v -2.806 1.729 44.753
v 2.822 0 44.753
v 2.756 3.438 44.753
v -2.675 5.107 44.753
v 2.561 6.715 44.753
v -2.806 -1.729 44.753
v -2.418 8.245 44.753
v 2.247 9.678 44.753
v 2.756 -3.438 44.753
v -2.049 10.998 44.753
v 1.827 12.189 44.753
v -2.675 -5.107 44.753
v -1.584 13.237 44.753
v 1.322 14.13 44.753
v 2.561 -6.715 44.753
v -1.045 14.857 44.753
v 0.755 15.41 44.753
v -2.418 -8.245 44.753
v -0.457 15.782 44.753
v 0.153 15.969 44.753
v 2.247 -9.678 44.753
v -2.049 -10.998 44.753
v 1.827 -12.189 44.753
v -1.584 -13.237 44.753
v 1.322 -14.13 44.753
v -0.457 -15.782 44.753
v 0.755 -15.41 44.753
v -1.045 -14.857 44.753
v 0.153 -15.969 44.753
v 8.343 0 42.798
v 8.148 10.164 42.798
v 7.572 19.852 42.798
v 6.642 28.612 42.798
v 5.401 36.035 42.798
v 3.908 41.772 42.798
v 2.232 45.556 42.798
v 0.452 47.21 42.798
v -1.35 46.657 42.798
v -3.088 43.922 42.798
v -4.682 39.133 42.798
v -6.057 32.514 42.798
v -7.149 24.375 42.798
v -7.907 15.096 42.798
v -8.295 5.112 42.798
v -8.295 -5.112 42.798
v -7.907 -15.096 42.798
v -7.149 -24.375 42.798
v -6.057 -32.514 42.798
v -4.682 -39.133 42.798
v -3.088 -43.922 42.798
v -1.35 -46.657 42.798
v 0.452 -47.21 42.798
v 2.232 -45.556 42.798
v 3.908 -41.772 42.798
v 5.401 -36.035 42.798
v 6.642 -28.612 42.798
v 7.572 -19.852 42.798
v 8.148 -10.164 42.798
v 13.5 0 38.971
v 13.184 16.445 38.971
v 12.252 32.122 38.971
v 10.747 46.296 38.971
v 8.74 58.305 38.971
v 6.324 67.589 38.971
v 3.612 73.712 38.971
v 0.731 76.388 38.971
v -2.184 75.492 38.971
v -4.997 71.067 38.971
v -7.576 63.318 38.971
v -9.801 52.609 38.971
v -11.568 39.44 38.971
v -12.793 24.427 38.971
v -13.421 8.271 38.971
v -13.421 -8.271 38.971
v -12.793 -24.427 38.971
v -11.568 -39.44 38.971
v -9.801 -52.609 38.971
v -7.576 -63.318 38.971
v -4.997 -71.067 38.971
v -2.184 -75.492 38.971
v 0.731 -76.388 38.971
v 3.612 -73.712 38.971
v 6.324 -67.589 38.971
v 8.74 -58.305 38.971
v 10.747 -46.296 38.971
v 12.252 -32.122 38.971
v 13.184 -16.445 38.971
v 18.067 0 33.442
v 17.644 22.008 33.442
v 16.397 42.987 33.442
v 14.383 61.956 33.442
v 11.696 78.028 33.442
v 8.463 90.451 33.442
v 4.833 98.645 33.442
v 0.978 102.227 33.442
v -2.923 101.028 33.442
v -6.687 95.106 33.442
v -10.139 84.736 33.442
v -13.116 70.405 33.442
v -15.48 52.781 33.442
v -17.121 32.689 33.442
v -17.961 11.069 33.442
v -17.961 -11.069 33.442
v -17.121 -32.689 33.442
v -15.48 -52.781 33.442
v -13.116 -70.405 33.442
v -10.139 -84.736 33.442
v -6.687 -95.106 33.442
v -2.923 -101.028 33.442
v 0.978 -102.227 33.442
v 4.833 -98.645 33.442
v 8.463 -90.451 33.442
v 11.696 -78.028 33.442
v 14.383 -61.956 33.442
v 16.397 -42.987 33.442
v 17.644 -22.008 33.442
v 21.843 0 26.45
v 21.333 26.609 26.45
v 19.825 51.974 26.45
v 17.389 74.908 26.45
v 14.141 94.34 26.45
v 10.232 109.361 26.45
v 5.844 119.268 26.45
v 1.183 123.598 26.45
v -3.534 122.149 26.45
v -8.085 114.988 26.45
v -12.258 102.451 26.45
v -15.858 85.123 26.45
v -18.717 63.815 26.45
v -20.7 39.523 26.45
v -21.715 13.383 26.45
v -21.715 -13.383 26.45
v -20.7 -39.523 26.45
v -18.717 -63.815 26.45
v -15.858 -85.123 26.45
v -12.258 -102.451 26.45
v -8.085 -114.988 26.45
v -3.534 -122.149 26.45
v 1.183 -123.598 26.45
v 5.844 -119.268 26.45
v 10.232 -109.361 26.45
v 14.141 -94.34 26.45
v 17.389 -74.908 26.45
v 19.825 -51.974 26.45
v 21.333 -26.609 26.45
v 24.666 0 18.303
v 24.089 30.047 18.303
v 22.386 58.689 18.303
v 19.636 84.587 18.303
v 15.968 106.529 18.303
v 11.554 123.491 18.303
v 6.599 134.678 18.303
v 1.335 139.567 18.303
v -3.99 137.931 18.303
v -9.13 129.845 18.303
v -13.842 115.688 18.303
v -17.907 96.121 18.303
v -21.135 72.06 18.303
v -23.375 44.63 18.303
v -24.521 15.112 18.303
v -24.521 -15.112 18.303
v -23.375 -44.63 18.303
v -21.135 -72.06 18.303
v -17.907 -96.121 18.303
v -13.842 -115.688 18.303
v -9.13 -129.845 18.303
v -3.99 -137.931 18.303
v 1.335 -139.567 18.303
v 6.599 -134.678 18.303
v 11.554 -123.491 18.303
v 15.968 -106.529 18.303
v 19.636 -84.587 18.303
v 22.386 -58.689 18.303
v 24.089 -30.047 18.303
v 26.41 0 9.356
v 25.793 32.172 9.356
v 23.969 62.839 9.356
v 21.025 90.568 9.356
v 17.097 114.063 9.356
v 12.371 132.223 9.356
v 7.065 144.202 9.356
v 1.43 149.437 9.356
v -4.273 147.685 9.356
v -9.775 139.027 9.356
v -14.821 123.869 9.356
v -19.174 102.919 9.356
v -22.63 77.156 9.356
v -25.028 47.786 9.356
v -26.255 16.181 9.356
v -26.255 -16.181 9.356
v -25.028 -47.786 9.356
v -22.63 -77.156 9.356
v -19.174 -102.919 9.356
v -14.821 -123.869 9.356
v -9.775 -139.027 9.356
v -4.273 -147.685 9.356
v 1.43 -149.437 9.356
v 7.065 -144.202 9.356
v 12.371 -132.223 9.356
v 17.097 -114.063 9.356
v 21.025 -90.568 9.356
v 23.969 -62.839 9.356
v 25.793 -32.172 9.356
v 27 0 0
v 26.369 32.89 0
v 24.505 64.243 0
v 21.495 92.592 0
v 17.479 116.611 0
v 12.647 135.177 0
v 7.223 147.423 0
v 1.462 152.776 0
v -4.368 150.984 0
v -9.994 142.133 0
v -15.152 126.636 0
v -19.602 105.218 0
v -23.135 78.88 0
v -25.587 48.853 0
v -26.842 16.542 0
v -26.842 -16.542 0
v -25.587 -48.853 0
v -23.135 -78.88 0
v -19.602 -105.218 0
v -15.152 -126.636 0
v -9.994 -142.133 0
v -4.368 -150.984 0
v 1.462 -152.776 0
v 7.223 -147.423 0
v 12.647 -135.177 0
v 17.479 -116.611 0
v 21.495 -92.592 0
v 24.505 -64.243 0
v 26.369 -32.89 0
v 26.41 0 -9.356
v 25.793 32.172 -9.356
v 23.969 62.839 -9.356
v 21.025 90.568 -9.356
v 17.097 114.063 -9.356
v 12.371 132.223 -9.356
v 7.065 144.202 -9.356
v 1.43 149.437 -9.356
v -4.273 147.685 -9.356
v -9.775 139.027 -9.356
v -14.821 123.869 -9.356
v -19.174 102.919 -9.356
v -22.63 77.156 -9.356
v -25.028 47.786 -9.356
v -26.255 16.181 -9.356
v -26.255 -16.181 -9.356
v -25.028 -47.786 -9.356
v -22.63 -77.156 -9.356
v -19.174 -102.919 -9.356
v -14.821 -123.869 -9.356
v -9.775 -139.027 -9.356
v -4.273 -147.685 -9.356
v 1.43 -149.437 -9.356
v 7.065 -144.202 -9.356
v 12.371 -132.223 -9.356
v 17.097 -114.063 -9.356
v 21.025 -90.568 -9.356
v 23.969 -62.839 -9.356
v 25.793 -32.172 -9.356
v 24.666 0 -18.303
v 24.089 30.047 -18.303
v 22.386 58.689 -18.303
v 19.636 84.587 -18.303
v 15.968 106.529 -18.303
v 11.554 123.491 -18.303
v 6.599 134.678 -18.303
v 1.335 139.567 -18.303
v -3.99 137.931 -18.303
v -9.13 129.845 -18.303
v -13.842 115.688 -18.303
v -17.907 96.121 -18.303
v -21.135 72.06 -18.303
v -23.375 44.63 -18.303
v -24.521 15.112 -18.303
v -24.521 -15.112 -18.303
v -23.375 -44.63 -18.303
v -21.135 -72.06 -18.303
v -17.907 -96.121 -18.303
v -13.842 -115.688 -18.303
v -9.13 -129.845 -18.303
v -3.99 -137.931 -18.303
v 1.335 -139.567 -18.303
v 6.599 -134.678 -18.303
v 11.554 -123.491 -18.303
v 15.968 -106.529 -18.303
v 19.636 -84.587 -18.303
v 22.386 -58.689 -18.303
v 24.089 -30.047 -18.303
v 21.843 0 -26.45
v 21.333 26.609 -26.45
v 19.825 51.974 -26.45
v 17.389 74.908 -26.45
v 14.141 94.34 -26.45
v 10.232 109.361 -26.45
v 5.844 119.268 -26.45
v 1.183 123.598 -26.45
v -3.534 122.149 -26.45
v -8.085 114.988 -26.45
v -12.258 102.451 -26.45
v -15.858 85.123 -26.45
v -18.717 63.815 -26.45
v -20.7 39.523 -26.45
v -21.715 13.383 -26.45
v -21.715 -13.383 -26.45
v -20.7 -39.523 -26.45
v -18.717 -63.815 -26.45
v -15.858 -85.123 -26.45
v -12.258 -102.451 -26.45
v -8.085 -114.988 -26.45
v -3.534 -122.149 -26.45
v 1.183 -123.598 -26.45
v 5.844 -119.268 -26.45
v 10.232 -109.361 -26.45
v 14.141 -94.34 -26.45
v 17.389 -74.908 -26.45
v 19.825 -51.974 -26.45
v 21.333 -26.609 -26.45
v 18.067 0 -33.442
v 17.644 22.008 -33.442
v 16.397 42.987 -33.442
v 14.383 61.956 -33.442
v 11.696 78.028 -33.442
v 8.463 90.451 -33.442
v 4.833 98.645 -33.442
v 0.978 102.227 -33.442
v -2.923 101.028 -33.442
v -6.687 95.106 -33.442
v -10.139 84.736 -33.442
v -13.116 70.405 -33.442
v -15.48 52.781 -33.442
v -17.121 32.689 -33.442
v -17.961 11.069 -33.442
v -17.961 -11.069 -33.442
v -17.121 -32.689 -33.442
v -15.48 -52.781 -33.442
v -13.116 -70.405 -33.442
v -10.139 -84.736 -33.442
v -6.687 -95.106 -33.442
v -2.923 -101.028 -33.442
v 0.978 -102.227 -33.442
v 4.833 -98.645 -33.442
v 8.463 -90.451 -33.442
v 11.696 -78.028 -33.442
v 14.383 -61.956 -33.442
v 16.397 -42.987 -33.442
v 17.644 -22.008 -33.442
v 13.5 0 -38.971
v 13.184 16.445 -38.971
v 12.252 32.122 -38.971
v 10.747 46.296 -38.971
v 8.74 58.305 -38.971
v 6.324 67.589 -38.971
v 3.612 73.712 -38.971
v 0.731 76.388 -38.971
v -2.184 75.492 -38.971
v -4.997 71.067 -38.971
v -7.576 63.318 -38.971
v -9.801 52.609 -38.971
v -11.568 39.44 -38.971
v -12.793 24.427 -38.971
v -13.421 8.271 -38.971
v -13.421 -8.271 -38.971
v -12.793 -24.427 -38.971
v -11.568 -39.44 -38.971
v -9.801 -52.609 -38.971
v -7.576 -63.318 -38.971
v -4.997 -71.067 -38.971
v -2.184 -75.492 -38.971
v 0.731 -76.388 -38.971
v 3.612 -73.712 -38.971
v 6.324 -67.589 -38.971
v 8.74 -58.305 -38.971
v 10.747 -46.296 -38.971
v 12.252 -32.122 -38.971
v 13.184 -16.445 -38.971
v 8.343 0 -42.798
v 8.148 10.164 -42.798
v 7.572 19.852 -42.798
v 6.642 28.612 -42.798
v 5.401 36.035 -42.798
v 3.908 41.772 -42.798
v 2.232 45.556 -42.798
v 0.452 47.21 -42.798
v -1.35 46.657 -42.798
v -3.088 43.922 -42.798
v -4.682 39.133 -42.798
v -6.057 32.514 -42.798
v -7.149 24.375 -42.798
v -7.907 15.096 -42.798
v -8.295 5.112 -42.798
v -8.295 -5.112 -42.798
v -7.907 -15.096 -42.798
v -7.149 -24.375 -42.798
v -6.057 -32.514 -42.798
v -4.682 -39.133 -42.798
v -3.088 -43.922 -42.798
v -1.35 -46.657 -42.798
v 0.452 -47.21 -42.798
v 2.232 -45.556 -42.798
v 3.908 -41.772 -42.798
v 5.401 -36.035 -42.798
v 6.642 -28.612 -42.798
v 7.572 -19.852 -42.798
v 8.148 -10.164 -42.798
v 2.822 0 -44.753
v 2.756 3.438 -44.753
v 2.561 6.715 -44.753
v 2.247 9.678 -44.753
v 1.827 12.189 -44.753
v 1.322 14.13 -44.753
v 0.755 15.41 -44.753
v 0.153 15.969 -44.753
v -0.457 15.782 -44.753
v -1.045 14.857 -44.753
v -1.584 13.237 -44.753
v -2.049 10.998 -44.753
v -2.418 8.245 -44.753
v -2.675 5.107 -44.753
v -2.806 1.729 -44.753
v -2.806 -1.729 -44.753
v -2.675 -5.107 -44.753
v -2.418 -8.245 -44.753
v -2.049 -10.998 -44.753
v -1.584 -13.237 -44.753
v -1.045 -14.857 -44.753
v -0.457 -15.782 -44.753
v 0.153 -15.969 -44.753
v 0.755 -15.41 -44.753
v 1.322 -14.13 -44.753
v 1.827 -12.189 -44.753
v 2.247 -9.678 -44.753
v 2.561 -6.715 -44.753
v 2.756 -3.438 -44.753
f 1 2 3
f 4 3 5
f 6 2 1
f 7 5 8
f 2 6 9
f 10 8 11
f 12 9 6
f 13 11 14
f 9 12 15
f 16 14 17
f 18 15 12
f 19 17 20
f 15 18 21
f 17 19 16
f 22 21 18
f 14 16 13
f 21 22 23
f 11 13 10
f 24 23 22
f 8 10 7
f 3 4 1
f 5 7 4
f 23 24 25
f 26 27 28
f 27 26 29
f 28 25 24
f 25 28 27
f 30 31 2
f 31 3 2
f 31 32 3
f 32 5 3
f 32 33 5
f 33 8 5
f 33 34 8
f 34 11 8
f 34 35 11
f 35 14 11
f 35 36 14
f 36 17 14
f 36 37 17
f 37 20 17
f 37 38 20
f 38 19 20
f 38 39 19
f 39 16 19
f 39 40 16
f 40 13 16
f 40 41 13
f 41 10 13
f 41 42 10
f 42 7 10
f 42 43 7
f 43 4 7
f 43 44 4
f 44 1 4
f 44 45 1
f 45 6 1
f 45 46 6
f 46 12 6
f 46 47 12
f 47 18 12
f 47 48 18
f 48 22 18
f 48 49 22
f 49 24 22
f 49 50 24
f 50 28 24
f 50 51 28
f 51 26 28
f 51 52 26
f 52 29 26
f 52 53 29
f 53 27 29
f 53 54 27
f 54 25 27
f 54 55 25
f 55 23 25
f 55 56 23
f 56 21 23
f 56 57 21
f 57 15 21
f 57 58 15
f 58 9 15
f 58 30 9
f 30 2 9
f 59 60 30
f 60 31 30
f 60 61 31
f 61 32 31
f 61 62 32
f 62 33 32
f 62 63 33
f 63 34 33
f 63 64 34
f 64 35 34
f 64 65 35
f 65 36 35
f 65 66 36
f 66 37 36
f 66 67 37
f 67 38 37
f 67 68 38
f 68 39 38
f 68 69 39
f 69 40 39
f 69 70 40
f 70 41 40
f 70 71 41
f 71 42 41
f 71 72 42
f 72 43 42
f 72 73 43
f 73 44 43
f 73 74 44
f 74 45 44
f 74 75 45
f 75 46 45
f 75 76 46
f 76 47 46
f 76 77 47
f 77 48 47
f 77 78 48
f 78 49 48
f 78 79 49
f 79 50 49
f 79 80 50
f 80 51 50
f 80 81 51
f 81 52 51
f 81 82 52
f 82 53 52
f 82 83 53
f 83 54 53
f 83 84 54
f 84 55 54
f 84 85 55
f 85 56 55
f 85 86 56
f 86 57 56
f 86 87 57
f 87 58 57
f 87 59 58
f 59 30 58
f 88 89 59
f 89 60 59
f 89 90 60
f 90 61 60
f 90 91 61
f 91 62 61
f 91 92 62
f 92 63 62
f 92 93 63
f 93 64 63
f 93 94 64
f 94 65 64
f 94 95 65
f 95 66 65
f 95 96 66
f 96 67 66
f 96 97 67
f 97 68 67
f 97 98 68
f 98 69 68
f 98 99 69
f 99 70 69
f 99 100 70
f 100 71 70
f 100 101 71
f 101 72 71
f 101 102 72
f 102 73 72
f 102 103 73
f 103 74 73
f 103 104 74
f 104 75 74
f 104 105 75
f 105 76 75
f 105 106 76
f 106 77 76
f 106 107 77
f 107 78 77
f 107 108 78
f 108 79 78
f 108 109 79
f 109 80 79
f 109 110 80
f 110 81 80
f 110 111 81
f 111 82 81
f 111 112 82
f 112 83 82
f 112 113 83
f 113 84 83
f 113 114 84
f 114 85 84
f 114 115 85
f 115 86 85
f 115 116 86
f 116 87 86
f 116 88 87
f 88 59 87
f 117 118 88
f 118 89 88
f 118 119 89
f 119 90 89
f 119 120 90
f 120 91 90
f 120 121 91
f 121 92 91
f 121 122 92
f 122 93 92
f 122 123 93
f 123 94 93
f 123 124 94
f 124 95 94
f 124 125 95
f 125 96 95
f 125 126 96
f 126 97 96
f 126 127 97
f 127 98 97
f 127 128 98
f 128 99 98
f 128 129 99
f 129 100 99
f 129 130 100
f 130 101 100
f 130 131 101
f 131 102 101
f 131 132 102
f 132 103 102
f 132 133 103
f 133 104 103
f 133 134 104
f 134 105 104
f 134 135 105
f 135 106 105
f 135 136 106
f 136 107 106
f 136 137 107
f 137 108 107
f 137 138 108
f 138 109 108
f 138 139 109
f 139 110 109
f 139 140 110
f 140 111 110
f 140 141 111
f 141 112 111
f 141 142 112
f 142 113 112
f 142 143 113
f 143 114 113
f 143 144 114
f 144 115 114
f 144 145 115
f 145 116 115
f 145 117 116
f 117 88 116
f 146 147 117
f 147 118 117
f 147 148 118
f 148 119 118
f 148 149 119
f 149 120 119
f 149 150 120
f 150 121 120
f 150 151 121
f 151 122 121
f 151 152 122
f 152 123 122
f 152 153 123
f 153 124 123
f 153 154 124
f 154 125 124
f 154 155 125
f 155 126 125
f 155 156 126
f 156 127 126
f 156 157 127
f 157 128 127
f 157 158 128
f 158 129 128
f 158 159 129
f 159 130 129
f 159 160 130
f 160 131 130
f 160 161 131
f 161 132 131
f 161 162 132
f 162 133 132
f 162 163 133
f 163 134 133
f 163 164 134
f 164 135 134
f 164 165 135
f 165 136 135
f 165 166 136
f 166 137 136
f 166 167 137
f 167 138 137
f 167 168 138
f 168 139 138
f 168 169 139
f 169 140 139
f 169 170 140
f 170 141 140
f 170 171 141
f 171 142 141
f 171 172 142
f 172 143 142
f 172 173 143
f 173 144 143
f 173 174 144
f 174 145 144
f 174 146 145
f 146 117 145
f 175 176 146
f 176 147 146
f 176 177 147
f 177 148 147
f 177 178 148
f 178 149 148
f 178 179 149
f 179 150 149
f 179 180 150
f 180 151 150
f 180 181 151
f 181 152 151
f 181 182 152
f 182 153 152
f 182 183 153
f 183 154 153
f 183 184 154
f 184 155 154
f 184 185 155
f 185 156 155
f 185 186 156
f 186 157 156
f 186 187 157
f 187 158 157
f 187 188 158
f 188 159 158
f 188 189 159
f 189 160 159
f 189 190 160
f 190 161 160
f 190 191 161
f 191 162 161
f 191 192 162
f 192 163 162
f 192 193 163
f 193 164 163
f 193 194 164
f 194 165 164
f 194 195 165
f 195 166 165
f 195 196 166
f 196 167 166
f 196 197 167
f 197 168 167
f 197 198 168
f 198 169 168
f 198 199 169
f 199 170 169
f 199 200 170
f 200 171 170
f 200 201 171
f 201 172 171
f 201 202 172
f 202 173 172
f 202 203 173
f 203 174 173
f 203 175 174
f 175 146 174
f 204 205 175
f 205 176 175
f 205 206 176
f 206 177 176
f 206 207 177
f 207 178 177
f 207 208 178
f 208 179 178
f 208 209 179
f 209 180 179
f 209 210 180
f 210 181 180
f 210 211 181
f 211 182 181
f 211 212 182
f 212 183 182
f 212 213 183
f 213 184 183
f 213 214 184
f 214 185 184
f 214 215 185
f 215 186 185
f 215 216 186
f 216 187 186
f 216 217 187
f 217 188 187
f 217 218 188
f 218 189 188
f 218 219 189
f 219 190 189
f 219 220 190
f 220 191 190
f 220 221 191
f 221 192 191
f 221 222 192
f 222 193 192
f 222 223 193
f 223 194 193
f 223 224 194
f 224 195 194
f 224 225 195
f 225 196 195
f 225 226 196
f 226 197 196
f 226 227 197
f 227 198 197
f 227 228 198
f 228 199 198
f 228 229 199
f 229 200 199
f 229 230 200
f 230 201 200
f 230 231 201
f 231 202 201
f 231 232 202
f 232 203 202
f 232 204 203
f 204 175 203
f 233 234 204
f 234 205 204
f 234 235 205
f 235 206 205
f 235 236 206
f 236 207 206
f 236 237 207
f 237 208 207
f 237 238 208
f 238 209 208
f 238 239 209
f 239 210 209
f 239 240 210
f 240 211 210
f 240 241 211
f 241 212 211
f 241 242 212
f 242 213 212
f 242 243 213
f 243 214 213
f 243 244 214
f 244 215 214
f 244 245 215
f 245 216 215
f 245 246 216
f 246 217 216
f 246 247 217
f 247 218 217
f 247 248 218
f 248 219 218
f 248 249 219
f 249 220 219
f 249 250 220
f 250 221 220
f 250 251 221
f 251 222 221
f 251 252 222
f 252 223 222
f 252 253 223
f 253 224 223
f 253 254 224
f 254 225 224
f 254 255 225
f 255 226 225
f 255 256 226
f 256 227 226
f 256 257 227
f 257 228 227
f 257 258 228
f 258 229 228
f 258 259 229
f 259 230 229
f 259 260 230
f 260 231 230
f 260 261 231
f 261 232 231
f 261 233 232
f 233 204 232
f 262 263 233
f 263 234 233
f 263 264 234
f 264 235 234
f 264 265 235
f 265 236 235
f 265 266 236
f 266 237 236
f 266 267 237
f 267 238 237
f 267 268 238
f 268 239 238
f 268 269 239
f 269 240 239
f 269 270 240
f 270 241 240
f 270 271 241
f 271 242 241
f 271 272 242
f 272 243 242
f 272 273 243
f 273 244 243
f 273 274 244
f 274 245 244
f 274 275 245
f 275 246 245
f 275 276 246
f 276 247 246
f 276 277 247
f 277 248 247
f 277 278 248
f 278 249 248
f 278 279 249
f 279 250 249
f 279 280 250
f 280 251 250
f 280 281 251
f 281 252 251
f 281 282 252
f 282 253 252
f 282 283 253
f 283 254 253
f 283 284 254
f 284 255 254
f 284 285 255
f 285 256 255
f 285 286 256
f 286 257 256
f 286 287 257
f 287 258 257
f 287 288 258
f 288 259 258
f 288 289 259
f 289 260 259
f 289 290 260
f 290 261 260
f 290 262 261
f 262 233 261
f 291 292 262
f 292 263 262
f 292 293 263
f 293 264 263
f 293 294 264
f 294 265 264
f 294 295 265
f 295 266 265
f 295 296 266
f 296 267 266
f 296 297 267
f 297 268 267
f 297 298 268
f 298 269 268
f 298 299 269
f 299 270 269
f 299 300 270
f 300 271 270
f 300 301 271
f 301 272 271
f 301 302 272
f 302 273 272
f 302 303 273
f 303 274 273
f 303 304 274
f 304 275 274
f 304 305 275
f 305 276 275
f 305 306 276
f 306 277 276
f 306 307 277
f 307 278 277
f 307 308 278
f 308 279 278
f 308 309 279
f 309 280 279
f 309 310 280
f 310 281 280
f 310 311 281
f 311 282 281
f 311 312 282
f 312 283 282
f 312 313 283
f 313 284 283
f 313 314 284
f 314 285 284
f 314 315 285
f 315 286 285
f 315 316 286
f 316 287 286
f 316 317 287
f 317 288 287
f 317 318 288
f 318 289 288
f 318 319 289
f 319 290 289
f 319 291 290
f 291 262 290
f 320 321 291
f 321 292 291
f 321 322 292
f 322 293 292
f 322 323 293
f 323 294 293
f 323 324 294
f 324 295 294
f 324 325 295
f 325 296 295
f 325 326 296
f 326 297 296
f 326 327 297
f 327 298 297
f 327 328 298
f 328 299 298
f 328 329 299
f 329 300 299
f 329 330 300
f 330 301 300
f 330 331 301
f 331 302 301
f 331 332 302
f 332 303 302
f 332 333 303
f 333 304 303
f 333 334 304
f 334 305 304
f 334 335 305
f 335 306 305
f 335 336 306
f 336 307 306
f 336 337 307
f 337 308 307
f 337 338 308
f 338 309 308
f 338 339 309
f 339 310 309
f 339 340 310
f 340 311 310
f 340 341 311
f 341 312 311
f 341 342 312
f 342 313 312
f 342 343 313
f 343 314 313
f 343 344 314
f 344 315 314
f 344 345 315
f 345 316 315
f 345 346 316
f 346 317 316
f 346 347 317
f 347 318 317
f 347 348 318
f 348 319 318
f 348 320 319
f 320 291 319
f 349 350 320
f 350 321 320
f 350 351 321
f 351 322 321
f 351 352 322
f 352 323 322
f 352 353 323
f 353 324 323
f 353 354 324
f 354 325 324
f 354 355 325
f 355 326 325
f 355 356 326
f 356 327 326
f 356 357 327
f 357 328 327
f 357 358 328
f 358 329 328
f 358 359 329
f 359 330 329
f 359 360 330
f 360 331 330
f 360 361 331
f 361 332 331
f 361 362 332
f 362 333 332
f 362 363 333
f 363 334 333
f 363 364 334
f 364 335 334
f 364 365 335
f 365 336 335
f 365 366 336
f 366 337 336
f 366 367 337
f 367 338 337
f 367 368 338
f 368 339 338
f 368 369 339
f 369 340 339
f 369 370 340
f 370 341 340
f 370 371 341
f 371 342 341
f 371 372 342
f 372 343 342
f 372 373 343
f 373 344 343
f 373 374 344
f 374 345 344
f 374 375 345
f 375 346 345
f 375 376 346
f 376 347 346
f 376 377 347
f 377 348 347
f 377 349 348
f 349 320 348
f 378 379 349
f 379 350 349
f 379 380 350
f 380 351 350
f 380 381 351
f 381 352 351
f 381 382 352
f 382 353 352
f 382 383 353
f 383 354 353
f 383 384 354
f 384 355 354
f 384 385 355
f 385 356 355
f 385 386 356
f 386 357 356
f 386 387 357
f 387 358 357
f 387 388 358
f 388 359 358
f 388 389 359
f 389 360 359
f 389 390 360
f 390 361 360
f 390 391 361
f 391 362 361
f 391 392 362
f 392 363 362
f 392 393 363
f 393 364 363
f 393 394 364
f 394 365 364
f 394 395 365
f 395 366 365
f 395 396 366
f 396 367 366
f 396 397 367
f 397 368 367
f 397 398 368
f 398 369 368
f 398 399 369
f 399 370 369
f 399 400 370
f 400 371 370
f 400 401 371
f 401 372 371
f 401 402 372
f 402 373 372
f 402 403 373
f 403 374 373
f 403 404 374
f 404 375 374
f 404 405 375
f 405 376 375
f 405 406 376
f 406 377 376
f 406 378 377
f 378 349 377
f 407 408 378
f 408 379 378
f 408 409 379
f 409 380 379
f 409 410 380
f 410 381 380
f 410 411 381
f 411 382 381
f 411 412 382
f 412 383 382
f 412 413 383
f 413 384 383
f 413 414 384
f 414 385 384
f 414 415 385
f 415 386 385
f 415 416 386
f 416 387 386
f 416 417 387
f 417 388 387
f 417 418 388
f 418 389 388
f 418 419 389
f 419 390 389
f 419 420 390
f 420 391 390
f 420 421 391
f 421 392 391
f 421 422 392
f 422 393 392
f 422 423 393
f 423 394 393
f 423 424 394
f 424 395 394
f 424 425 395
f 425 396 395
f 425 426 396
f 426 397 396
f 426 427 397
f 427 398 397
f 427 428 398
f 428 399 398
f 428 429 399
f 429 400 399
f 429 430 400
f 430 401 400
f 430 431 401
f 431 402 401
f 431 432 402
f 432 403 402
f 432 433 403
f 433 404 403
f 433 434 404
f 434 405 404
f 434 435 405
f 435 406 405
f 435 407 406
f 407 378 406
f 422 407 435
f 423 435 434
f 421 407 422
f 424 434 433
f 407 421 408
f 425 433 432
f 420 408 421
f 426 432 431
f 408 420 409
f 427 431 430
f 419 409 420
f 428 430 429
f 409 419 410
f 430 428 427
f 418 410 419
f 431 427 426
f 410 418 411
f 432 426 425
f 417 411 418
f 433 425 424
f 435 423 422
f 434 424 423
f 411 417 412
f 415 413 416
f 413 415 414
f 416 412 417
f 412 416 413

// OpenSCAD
// Generated by SolidPython 1.0.1 on 2020-07-29 00:46:45


scale(v = [3, 17, 5]) {
	sphere(r = 9);
}
/***********************************************
*********      SolidPython code:      **********
************************************************
 
# import packages: SolidPython
from solid import *
from solid.utils import *
from itertools import chain, combinations, permutations


class Resize:

    def __init__(self, scad_file):
        self.scad_file = scad_file
        #self.scad_file = import_scad(scad_file)
        # cone/cylinder param:
        self.r1 = 0
        self.r2 = 0
        self.h = 0
        # rectangular prism param:
        self.w = 0
        self.l = 0
        # ellipse param:
        self.r = 0

    # import OpenScad code (file name corresponds to shape)


    # classify shape + parameters
    def assign(self, param1, param2, param3):
        if self.scad_file == 'cone.scad':
            self.r1 = param1
            self.r2 = param2
            self.h = param3
        elif self.scad_file == 'cylinder.scad':
            self.r1 = param1
            self.r2 = param2
            self.h = param3
        elif self.scad_file == 'rectangularPrism.scad':
            self.h = param1
            self.l = param2
            self.w = param3
        else:
            self.r = param1
            self.h = param2

    # resize parameters
    def iterate(self):
        x = range(3, 20, 2)
        i = 1
        if self.scad_file == 'cone.scad':
            tempList = list(permutations(x, 2))
            for temp in tempList:
                param1 = temp[0]
                param2 = temp[1]
                filepath = 'produced_scad_files/' + 'cone' + str(param1) + '_' + str(param2) + '_' + '.scad'
                scad_render_to_file(cylinder(h=param1, r1=param2, r2=0), filepath)

        elif self.scad_file == 'cylinder.scad':
            tempList = list(permutations(x, 3))
            for temp in tempList:
                param1 = temp[0]
                param2 = temp[1]
                filepath = 'produced_scad_files/' + 'cylinder' + str(param1) + '_' + str(param2) + '_' + '.scad'
                scad_render_to_file(cylinder(h=param1, r1=param2, r2=param2), filepath)

        elif self.scad_file == 'rectangularPrism.scad':
            tempList = list(permutations(x, 3))
            for temp in tempList:
                param1 = temp[0]
                param2 = temp[1]
                param3 = temp[2]
                filepath = 'produced_scad_files/' + 'rectangularPrism' + str(param1) + '_' + str(param2) + '_' + str(
                    param3) + '.scad'
                scad_render_to_file(cube(size=(param1, param2, param3)), filepath)

        elif self.scad_file == 'ellipse.scad':
            tempList = list(permutations(x, 4))
            for temp in tempList:
                param1 = temp[0]
                param2 = temp[1]
                param3 = temp[2]
                param4 = temp[3]
                filepath = 'produced_scad_files/' + 'ellipse' + str(param1) + '_' + str(param2) + '_' + str(param3) + '_' + str(param4) + '.scad'
                scad_render_to_file(scale([param1, param2, param3])(sphere(r=param4)), filepath)

    def render_to_scadfile(self):
        scad_render_to_file(scad, 'example.scad') 
 
************************************************/
